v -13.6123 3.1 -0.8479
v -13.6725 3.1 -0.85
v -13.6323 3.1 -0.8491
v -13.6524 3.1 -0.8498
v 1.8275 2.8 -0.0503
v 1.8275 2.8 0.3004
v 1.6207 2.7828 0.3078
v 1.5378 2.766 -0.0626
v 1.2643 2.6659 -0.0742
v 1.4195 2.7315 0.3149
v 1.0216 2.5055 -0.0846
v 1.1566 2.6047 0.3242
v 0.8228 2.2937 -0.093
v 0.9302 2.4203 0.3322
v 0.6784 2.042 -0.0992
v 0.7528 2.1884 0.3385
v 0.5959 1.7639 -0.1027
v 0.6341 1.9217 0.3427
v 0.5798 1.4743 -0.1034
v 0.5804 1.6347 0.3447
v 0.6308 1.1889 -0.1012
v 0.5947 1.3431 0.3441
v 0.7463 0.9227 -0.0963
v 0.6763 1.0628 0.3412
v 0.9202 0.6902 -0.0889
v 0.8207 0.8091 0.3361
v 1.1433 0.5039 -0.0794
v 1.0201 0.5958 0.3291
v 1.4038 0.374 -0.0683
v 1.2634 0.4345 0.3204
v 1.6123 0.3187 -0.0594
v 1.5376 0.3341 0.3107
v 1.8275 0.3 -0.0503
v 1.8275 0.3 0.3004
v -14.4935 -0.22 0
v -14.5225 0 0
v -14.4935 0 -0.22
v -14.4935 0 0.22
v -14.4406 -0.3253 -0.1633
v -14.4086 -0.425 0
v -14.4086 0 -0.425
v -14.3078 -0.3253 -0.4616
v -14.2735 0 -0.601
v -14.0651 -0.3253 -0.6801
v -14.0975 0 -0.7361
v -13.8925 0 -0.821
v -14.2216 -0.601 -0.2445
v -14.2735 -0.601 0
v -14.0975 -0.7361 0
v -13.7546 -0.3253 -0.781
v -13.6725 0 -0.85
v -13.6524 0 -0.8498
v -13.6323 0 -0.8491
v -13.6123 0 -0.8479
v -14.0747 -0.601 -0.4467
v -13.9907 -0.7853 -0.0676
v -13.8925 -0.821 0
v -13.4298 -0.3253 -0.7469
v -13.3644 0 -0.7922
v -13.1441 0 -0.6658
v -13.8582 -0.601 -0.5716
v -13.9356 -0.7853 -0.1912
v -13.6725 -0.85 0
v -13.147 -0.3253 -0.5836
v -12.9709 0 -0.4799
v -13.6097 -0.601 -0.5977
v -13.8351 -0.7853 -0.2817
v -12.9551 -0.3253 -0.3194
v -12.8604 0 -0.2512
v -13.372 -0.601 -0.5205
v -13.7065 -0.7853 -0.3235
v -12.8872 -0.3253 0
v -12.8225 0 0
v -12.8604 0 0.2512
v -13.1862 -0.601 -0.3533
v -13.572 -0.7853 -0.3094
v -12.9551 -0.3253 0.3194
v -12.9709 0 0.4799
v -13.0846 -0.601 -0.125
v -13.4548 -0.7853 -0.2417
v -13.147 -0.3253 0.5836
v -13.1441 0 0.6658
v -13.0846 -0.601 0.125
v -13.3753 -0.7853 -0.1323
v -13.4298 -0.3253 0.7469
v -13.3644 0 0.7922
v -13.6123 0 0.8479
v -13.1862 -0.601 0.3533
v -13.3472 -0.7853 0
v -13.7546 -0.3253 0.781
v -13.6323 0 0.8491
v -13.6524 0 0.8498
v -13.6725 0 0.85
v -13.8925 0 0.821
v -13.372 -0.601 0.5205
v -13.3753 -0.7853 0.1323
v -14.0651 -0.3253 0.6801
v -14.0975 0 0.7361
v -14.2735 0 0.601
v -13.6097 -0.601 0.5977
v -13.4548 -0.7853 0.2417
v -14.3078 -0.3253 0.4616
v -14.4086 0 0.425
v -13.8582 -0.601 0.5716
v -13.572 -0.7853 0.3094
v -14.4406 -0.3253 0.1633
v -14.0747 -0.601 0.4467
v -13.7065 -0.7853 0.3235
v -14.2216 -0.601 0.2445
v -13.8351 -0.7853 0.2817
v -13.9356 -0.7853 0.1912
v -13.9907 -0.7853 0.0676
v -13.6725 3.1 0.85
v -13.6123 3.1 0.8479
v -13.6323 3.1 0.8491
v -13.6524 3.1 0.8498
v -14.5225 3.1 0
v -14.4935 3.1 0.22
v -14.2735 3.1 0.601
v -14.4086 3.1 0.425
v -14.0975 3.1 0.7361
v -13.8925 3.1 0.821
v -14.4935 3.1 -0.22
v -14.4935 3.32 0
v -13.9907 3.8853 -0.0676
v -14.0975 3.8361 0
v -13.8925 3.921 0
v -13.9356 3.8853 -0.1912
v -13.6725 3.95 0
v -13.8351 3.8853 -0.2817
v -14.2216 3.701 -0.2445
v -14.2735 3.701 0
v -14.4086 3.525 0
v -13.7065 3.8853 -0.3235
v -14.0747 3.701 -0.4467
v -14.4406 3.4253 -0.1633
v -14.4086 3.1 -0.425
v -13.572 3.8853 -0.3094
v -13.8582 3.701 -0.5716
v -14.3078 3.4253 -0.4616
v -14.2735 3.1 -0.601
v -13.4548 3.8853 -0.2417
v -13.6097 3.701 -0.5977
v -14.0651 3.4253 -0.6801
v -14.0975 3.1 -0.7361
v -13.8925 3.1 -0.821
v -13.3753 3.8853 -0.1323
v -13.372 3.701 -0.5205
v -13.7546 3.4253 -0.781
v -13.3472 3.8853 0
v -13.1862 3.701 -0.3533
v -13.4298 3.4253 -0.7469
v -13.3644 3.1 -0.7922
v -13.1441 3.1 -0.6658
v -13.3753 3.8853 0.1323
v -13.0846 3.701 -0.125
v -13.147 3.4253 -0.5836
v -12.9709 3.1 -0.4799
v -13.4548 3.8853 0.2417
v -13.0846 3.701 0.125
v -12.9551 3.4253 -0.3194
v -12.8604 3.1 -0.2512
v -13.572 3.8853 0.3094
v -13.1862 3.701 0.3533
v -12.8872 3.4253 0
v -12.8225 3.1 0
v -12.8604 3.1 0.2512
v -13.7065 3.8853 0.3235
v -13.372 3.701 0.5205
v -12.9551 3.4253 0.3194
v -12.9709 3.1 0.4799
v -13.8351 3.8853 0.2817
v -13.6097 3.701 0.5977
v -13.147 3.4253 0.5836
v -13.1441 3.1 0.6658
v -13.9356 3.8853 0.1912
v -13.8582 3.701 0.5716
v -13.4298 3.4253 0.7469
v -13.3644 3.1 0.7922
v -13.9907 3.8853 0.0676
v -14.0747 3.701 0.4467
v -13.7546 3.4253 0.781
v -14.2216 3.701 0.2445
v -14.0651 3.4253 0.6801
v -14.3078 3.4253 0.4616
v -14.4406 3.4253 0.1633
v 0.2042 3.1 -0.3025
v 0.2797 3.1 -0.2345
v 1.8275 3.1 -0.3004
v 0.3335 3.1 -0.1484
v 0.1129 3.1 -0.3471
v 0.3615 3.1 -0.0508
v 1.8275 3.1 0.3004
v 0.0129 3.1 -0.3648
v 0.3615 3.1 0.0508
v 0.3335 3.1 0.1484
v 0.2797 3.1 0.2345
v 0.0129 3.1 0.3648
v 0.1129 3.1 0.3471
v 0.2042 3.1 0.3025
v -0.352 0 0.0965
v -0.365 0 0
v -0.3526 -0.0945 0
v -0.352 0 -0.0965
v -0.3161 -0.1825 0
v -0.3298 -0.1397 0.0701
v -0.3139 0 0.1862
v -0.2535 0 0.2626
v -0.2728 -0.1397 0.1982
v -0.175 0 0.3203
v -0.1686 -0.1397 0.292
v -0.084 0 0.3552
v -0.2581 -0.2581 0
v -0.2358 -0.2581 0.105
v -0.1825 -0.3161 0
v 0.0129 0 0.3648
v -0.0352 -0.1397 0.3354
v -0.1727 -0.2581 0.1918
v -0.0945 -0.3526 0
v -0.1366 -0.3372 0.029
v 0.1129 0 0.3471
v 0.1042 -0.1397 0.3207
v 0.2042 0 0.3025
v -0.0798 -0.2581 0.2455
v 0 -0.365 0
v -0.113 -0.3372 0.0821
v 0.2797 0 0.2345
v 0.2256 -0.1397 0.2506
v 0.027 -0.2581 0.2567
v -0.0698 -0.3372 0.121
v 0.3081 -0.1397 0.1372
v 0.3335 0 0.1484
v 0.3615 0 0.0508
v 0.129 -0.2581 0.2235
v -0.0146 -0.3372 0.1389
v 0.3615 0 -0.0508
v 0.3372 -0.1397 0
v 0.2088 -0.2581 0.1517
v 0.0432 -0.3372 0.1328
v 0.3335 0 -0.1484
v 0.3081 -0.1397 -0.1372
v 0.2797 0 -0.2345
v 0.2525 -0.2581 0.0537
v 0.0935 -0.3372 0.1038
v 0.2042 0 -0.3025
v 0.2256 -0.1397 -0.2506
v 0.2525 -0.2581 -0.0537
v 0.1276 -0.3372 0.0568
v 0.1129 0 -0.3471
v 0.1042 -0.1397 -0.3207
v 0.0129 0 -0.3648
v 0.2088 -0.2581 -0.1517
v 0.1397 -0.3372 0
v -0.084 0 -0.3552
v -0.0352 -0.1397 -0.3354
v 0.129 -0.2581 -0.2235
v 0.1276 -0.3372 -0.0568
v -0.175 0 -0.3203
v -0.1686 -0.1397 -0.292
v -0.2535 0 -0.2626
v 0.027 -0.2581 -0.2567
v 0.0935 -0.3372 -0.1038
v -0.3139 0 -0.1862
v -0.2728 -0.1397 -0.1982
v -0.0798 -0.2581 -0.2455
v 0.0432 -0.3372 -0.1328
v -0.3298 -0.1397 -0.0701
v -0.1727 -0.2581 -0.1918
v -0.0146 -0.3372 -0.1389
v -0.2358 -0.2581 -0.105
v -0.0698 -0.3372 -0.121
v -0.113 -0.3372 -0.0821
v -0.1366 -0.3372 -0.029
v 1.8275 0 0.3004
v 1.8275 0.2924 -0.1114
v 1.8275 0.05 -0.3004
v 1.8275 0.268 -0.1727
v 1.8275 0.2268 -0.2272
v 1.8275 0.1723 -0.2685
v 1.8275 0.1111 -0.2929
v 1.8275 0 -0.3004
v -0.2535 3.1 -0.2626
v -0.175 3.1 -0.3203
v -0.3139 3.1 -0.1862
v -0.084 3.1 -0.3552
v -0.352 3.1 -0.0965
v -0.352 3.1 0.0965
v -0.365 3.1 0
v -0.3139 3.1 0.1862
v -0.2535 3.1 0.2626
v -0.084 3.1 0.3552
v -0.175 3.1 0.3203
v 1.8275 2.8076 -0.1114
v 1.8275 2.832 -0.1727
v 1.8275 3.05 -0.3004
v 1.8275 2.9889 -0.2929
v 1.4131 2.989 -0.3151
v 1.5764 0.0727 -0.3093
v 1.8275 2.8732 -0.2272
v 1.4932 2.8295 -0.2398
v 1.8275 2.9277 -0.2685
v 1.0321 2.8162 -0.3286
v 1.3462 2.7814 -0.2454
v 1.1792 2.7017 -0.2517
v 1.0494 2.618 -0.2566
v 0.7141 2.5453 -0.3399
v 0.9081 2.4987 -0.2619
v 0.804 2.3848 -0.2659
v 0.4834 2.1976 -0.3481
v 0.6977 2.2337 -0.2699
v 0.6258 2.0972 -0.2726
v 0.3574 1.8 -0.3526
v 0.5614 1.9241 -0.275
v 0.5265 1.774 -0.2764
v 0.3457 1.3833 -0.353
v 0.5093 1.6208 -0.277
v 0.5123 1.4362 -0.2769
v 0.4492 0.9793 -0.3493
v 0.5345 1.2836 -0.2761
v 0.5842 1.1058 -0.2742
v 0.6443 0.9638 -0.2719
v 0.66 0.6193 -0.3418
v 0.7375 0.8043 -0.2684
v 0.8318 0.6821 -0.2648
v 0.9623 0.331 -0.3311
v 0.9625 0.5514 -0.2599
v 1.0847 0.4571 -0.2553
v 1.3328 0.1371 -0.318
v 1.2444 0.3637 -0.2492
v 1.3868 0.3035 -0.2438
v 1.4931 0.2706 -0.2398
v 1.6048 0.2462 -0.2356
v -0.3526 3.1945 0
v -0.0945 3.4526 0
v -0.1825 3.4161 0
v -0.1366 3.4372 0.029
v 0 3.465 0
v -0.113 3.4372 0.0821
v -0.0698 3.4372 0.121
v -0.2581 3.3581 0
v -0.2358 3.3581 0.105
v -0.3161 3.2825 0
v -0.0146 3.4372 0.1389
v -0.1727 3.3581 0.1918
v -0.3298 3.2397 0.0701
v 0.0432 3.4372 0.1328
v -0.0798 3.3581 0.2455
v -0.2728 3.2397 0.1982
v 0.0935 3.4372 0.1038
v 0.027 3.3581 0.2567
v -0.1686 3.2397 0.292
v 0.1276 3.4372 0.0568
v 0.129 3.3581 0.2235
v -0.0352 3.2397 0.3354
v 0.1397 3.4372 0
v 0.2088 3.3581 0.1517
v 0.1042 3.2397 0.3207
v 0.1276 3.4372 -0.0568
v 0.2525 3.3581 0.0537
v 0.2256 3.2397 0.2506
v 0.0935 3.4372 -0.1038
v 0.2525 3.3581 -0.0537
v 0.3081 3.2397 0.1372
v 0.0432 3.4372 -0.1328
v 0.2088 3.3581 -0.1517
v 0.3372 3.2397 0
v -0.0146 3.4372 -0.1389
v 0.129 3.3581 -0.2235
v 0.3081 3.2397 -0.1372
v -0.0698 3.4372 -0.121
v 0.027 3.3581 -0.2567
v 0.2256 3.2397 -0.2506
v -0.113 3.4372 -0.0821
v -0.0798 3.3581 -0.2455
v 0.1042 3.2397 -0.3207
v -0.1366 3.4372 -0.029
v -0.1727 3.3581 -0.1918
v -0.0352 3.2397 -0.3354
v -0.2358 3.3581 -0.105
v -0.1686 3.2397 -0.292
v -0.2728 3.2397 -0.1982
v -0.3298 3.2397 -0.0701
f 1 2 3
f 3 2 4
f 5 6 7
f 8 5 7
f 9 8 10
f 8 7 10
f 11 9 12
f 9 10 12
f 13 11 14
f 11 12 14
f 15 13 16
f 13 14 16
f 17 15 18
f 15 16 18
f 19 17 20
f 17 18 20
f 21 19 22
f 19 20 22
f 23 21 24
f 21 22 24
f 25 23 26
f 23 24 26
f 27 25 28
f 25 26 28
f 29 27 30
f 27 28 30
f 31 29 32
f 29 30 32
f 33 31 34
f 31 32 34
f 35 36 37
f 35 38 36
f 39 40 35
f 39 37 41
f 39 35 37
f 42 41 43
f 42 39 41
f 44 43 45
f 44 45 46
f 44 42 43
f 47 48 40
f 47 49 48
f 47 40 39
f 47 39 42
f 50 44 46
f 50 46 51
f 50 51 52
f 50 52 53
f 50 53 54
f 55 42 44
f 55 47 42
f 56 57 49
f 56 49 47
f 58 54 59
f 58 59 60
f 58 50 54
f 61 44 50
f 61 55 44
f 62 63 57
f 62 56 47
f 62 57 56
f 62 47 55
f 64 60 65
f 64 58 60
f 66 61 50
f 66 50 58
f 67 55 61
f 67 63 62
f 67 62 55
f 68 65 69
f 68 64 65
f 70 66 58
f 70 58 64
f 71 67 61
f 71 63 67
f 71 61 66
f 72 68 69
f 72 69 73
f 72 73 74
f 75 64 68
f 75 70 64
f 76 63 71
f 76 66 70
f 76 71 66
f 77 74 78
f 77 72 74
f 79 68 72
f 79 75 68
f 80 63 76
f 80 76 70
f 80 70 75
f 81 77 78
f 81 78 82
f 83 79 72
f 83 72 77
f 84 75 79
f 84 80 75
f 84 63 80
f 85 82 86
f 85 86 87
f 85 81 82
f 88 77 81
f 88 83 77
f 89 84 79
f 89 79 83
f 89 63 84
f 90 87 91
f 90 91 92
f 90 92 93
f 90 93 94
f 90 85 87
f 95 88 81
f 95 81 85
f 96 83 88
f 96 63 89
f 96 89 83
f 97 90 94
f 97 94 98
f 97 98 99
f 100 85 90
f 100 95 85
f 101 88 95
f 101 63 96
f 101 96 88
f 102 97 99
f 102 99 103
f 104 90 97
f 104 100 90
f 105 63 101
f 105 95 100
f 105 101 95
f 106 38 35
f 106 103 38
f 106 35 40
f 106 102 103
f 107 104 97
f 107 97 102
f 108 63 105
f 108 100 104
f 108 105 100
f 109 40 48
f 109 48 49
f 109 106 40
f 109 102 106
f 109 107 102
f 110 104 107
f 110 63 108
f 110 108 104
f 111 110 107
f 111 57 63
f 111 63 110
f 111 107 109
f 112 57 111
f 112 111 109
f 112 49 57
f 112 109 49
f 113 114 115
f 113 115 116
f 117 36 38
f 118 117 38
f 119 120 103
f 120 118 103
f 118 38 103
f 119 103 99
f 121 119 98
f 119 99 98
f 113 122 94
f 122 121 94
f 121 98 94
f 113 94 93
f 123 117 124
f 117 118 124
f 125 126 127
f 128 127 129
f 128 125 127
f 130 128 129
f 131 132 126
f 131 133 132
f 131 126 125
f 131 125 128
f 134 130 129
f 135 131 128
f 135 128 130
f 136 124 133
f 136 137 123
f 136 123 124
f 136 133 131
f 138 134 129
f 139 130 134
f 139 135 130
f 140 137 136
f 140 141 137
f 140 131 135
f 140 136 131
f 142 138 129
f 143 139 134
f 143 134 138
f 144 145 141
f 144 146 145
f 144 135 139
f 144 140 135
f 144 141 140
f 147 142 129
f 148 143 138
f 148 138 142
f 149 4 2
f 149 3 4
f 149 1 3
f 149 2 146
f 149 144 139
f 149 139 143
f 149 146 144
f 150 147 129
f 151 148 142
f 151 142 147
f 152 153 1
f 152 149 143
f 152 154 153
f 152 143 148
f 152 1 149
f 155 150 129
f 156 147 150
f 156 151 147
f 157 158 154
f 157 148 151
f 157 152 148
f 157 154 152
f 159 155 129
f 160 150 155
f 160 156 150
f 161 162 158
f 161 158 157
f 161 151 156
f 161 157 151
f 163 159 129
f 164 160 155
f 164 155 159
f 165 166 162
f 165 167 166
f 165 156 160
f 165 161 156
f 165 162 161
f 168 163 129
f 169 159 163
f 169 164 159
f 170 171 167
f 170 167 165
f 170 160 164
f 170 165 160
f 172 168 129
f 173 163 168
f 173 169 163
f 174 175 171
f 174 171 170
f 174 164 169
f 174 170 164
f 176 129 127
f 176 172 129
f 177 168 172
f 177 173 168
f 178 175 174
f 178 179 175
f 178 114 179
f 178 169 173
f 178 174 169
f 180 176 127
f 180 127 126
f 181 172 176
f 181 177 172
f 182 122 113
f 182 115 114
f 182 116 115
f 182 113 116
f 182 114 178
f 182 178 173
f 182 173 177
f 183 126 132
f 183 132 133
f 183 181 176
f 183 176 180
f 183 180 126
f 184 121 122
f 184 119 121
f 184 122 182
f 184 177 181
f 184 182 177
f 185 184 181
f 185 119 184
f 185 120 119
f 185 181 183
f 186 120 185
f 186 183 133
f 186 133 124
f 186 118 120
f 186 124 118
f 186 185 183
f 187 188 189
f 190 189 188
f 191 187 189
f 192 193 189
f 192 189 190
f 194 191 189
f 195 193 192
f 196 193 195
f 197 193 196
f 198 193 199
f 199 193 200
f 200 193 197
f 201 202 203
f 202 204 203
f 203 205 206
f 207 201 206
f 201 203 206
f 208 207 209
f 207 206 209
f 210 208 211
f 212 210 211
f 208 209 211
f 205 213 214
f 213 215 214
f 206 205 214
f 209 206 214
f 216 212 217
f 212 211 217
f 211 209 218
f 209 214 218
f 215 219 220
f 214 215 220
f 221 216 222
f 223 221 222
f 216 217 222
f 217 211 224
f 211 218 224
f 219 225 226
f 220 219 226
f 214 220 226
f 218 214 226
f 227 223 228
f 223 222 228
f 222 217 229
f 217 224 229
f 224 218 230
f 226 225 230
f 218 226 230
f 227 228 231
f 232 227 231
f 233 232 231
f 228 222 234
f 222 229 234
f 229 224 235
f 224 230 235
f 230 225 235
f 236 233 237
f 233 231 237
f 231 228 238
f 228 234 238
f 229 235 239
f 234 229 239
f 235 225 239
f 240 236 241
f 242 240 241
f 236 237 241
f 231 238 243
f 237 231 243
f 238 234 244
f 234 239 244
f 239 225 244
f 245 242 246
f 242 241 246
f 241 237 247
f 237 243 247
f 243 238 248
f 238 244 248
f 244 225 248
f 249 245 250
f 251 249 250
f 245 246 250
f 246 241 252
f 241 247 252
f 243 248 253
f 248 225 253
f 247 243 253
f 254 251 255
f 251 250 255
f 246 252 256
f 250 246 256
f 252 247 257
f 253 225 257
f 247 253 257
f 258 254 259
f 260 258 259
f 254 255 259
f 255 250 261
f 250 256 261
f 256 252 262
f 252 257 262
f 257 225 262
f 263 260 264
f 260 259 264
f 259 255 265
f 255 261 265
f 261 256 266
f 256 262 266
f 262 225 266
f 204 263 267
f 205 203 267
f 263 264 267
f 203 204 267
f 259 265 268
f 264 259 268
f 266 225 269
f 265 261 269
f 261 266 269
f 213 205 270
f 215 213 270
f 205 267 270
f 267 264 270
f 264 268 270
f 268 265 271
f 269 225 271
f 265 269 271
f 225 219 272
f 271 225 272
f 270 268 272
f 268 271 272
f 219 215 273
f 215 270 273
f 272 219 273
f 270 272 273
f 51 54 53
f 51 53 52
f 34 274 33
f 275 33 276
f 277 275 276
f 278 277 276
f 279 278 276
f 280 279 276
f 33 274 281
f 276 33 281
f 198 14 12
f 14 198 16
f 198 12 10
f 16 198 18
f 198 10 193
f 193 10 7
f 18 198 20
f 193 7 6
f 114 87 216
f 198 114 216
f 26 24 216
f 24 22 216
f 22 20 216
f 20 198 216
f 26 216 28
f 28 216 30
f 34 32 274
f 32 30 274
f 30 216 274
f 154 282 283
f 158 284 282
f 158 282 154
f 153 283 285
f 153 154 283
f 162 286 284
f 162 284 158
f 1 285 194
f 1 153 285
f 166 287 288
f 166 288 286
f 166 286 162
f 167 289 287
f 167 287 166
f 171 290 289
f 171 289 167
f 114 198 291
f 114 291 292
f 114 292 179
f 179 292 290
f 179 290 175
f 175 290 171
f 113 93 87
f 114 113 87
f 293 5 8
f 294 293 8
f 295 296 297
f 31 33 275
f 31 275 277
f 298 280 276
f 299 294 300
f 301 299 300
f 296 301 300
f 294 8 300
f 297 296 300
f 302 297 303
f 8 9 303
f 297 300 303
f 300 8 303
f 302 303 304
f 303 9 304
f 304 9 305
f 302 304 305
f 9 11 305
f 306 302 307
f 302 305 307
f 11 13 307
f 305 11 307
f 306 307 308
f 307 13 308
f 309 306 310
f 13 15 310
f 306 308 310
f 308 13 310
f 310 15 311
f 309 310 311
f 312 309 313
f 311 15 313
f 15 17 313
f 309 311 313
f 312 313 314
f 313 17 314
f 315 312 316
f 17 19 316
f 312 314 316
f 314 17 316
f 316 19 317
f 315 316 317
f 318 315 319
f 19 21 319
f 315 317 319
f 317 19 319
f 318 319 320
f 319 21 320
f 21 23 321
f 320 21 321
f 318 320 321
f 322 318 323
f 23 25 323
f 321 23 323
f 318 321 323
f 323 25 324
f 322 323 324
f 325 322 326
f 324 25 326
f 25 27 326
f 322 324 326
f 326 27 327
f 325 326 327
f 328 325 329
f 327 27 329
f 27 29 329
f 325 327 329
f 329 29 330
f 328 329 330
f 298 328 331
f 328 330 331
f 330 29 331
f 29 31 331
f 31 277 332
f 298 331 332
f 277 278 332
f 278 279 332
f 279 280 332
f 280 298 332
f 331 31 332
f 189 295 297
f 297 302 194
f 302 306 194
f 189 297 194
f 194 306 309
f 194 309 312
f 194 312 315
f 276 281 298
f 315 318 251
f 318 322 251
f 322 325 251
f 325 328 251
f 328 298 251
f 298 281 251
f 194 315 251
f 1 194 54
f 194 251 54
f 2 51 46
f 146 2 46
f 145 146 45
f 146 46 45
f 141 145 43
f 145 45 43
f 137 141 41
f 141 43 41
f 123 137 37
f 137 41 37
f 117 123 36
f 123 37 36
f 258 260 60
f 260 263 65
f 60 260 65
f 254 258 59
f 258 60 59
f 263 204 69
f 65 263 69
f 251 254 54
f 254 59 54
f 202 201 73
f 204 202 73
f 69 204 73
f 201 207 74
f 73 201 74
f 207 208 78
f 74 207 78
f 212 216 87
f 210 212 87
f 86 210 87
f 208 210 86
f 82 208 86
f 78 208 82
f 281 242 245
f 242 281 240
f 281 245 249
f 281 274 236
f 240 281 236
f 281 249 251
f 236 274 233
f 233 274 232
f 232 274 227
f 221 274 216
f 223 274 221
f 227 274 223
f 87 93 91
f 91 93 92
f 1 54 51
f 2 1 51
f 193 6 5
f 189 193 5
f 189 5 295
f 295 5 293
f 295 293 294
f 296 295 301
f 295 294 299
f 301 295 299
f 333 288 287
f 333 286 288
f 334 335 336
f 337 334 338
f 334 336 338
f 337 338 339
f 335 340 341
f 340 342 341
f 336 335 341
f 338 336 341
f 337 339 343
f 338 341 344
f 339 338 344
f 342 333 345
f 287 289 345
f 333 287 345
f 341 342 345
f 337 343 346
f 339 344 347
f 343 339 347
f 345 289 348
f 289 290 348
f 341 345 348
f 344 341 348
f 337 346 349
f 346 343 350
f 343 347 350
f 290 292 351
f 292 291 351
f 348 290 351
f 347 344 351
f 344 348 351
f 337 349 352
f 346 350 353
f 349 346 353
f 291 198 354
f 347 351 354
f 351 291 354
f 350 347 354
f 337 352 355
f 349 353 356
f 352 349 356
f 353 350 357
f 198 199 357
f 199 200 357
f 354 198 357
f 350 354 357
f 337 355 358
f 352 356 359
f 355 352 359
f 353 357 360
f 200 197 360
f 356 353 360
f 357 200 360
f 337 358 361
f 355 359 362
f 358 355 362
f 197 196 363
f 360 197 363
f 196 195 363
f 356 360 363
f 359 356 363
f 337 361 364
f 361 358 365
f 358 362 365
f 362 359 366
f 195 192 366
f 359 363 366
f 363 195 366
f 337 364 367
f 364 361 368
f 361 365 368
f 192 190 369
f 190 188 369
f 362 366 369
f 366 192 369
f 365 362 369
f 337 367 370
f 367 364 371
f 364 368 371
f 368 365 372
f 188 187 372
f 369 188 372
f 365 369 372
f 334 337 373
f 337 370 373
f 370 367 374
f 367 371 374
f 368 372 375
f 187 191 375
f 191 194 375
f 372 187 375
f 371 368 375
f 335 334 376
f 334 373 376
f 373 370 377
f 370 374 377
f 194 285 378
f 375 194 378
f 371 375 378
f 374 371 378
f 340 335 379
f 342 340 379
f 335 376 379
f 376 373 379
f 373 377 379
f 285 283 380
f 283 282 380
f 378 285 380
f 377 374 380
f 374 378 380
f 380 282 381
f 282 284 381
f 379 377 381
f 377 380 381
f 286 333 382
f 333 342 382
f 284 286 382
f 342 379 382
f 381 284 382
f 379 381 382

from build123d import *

# Parameters (mm, degrees)
F4_DEPTH = 3.1
F5_DEPTH = 0.5
F6_R     = 0.25


# Not quite as in the source:
# - a feature names something its author has since deleted; it is built from what else it names


with BuildPart() as f1:
    # F0 (on Top) → F1 (revolve)
    with BuildSketch(Plane.XY):
        with BuildLine():
            Line((-14.52249, 3.1), (-13.67249, 3.1))
            Line((-13.67249, 3.1), (-13.67249, 3.95))
            ThreePointArc((-13.67249, 3.95), (-14.273530764, 3.701040764), (-14.52249, 3.1))
        make_face()
    revolve(axis=Axis((-13.67249, 1.55, 0), (0, -1, 0)))



with BuildPart() as f1b:
    # F0 (on Top) → F1, piece 2 (revolve)
    with BuildSketch(Plane.XY):
        with BuildLine():
            Line((-13.67249, -0.85), (-13.67249, 0))
            Line((-13.67249, 0), (-14.52249, 0))
            ThreePointArc((-14.52249, 0), (-14.273530764, -0.601040764), (-13.67249, -0.85))
        make_face()
    revolve(axis=Axis((-13.67249, 1.55, 0), (0, -1, 0)))


with BuildPart() as f2:
    # F0 (on Top) → F2 (revolve)
    with BuildSketch(Plane.XY):
        with BuildLine():
            Line((-0.365, 3.1), (0, 3.1))
            Line((0, 3.1), (0, 3.465))
            ThreePointArc((0, 3.465), (-0.2580939751, 3.3580939751), (-0.365, 3.1))
        make_face()
    revolve(axis=Axis((0, 1.55, 0), (0, 1, 0)))


with BuildPart() as f2b:
    # F0 (on Top) → F2, piece 2 (revolve)
    with BuildSketch(Plane.XY):
        with BuildLine():
            Line((0, -0.365), (0, 0))
            Line((0, 0), (-0.365, 0))
            ThreePointArc((-0.365, 0), (-0.2580939751, -0.2580939751), (0, -0.365))
        make_face()
    revolve(axis=Axis((0, 1.55, 0), (0, 1, 0)))


with BuildPart() as f1_1:
    add(f1.part)

    add(f1b.part)  # F4 merges F1b

    add(f2.part)  # F4 merges F2

    add(f2b.part)  # F4 merges F2b
    # F3 (on face) → F4 (join, through all)
    with BuildSketch(Plane(origin=(0, 0, 0), x_dir=(-1, 0, 0), z_dir=(0, 1, 0))):
        with BuildLine():
            Line((-1.82751, 0), (12.82249, 0))
            ThreePointArc((12.82249, 0), (13.0505296028, 0.579366261), (13.612290622, 0.847865576))
            Line((13.612290622, 0.847865576), (-1.82751, 0.3004333129))
            Line((-1.82751, 0.3004333129), (-1.82751, 0))
        make_face()
        with BuildLine():
            Line((-1.82751, -0.3004333129), (13.612290622, -0.847865576))
            ThreePointArc((13.612290622, -0.847865576), (13.0505296028, -0.579366261), (12.82249, 0))
            Line((12.82249, 0), (-1.82751, 0))
            Line((-1.82751, 0), (-1.82751, -0.3004333129))
        make_face()
        with BuildLine():
            Line((12.82249, 0), (14.52249, 0))
            ThreePointArc((14.52249, 0), (14.273530764, 0.601040764), (13.67249, 0.85))
            Line((13.67249, 0.85), (13.612290622, 0.847865576))
            ThreePointArc((13.612290622, 0.847865576), (13.0505296028, 0.579366261), (12.82249, 0))
        make_face()
        with BuildLine():
            Line((13.612290622, -0.847865576), (13.67249, -0.85))
            ThreePointArc((13.67249, -0.85), (14.273530764, -0.601040764), (14.52249, 0))
            Line((14.52249, 0), (12.82249, 0))
            ThreePointArc((12.82249, 0), (13.0505296028, -0.579366261), (13.612290622, -0.847865576))
        make_face()
    extrude(amount=F4_DEPTH)

    # F0 (on Top) → F5 (cut, symmetric)
    with BuildSketch(Plane.XY):
        with BuildLine():
            ThreePointArc((1.82751, 2.8), (0.57751, 1.55), (1.82751, 0.3))
            Line((1.82751, 0.3), (1.82751, 2.8))
        make_face()
    extrude(amount=F5_DEPTH, both=True, mode=Mode.SUBTRACT)

    # F6
    f6_edges = [f1_1.edges().sort_by_distance(p)[0] for p in [
        (0.57751, 1.55, -0.344753),
    ]]
    fillet(f6_edges, radius=F6_R)


solid = f1_1.part
